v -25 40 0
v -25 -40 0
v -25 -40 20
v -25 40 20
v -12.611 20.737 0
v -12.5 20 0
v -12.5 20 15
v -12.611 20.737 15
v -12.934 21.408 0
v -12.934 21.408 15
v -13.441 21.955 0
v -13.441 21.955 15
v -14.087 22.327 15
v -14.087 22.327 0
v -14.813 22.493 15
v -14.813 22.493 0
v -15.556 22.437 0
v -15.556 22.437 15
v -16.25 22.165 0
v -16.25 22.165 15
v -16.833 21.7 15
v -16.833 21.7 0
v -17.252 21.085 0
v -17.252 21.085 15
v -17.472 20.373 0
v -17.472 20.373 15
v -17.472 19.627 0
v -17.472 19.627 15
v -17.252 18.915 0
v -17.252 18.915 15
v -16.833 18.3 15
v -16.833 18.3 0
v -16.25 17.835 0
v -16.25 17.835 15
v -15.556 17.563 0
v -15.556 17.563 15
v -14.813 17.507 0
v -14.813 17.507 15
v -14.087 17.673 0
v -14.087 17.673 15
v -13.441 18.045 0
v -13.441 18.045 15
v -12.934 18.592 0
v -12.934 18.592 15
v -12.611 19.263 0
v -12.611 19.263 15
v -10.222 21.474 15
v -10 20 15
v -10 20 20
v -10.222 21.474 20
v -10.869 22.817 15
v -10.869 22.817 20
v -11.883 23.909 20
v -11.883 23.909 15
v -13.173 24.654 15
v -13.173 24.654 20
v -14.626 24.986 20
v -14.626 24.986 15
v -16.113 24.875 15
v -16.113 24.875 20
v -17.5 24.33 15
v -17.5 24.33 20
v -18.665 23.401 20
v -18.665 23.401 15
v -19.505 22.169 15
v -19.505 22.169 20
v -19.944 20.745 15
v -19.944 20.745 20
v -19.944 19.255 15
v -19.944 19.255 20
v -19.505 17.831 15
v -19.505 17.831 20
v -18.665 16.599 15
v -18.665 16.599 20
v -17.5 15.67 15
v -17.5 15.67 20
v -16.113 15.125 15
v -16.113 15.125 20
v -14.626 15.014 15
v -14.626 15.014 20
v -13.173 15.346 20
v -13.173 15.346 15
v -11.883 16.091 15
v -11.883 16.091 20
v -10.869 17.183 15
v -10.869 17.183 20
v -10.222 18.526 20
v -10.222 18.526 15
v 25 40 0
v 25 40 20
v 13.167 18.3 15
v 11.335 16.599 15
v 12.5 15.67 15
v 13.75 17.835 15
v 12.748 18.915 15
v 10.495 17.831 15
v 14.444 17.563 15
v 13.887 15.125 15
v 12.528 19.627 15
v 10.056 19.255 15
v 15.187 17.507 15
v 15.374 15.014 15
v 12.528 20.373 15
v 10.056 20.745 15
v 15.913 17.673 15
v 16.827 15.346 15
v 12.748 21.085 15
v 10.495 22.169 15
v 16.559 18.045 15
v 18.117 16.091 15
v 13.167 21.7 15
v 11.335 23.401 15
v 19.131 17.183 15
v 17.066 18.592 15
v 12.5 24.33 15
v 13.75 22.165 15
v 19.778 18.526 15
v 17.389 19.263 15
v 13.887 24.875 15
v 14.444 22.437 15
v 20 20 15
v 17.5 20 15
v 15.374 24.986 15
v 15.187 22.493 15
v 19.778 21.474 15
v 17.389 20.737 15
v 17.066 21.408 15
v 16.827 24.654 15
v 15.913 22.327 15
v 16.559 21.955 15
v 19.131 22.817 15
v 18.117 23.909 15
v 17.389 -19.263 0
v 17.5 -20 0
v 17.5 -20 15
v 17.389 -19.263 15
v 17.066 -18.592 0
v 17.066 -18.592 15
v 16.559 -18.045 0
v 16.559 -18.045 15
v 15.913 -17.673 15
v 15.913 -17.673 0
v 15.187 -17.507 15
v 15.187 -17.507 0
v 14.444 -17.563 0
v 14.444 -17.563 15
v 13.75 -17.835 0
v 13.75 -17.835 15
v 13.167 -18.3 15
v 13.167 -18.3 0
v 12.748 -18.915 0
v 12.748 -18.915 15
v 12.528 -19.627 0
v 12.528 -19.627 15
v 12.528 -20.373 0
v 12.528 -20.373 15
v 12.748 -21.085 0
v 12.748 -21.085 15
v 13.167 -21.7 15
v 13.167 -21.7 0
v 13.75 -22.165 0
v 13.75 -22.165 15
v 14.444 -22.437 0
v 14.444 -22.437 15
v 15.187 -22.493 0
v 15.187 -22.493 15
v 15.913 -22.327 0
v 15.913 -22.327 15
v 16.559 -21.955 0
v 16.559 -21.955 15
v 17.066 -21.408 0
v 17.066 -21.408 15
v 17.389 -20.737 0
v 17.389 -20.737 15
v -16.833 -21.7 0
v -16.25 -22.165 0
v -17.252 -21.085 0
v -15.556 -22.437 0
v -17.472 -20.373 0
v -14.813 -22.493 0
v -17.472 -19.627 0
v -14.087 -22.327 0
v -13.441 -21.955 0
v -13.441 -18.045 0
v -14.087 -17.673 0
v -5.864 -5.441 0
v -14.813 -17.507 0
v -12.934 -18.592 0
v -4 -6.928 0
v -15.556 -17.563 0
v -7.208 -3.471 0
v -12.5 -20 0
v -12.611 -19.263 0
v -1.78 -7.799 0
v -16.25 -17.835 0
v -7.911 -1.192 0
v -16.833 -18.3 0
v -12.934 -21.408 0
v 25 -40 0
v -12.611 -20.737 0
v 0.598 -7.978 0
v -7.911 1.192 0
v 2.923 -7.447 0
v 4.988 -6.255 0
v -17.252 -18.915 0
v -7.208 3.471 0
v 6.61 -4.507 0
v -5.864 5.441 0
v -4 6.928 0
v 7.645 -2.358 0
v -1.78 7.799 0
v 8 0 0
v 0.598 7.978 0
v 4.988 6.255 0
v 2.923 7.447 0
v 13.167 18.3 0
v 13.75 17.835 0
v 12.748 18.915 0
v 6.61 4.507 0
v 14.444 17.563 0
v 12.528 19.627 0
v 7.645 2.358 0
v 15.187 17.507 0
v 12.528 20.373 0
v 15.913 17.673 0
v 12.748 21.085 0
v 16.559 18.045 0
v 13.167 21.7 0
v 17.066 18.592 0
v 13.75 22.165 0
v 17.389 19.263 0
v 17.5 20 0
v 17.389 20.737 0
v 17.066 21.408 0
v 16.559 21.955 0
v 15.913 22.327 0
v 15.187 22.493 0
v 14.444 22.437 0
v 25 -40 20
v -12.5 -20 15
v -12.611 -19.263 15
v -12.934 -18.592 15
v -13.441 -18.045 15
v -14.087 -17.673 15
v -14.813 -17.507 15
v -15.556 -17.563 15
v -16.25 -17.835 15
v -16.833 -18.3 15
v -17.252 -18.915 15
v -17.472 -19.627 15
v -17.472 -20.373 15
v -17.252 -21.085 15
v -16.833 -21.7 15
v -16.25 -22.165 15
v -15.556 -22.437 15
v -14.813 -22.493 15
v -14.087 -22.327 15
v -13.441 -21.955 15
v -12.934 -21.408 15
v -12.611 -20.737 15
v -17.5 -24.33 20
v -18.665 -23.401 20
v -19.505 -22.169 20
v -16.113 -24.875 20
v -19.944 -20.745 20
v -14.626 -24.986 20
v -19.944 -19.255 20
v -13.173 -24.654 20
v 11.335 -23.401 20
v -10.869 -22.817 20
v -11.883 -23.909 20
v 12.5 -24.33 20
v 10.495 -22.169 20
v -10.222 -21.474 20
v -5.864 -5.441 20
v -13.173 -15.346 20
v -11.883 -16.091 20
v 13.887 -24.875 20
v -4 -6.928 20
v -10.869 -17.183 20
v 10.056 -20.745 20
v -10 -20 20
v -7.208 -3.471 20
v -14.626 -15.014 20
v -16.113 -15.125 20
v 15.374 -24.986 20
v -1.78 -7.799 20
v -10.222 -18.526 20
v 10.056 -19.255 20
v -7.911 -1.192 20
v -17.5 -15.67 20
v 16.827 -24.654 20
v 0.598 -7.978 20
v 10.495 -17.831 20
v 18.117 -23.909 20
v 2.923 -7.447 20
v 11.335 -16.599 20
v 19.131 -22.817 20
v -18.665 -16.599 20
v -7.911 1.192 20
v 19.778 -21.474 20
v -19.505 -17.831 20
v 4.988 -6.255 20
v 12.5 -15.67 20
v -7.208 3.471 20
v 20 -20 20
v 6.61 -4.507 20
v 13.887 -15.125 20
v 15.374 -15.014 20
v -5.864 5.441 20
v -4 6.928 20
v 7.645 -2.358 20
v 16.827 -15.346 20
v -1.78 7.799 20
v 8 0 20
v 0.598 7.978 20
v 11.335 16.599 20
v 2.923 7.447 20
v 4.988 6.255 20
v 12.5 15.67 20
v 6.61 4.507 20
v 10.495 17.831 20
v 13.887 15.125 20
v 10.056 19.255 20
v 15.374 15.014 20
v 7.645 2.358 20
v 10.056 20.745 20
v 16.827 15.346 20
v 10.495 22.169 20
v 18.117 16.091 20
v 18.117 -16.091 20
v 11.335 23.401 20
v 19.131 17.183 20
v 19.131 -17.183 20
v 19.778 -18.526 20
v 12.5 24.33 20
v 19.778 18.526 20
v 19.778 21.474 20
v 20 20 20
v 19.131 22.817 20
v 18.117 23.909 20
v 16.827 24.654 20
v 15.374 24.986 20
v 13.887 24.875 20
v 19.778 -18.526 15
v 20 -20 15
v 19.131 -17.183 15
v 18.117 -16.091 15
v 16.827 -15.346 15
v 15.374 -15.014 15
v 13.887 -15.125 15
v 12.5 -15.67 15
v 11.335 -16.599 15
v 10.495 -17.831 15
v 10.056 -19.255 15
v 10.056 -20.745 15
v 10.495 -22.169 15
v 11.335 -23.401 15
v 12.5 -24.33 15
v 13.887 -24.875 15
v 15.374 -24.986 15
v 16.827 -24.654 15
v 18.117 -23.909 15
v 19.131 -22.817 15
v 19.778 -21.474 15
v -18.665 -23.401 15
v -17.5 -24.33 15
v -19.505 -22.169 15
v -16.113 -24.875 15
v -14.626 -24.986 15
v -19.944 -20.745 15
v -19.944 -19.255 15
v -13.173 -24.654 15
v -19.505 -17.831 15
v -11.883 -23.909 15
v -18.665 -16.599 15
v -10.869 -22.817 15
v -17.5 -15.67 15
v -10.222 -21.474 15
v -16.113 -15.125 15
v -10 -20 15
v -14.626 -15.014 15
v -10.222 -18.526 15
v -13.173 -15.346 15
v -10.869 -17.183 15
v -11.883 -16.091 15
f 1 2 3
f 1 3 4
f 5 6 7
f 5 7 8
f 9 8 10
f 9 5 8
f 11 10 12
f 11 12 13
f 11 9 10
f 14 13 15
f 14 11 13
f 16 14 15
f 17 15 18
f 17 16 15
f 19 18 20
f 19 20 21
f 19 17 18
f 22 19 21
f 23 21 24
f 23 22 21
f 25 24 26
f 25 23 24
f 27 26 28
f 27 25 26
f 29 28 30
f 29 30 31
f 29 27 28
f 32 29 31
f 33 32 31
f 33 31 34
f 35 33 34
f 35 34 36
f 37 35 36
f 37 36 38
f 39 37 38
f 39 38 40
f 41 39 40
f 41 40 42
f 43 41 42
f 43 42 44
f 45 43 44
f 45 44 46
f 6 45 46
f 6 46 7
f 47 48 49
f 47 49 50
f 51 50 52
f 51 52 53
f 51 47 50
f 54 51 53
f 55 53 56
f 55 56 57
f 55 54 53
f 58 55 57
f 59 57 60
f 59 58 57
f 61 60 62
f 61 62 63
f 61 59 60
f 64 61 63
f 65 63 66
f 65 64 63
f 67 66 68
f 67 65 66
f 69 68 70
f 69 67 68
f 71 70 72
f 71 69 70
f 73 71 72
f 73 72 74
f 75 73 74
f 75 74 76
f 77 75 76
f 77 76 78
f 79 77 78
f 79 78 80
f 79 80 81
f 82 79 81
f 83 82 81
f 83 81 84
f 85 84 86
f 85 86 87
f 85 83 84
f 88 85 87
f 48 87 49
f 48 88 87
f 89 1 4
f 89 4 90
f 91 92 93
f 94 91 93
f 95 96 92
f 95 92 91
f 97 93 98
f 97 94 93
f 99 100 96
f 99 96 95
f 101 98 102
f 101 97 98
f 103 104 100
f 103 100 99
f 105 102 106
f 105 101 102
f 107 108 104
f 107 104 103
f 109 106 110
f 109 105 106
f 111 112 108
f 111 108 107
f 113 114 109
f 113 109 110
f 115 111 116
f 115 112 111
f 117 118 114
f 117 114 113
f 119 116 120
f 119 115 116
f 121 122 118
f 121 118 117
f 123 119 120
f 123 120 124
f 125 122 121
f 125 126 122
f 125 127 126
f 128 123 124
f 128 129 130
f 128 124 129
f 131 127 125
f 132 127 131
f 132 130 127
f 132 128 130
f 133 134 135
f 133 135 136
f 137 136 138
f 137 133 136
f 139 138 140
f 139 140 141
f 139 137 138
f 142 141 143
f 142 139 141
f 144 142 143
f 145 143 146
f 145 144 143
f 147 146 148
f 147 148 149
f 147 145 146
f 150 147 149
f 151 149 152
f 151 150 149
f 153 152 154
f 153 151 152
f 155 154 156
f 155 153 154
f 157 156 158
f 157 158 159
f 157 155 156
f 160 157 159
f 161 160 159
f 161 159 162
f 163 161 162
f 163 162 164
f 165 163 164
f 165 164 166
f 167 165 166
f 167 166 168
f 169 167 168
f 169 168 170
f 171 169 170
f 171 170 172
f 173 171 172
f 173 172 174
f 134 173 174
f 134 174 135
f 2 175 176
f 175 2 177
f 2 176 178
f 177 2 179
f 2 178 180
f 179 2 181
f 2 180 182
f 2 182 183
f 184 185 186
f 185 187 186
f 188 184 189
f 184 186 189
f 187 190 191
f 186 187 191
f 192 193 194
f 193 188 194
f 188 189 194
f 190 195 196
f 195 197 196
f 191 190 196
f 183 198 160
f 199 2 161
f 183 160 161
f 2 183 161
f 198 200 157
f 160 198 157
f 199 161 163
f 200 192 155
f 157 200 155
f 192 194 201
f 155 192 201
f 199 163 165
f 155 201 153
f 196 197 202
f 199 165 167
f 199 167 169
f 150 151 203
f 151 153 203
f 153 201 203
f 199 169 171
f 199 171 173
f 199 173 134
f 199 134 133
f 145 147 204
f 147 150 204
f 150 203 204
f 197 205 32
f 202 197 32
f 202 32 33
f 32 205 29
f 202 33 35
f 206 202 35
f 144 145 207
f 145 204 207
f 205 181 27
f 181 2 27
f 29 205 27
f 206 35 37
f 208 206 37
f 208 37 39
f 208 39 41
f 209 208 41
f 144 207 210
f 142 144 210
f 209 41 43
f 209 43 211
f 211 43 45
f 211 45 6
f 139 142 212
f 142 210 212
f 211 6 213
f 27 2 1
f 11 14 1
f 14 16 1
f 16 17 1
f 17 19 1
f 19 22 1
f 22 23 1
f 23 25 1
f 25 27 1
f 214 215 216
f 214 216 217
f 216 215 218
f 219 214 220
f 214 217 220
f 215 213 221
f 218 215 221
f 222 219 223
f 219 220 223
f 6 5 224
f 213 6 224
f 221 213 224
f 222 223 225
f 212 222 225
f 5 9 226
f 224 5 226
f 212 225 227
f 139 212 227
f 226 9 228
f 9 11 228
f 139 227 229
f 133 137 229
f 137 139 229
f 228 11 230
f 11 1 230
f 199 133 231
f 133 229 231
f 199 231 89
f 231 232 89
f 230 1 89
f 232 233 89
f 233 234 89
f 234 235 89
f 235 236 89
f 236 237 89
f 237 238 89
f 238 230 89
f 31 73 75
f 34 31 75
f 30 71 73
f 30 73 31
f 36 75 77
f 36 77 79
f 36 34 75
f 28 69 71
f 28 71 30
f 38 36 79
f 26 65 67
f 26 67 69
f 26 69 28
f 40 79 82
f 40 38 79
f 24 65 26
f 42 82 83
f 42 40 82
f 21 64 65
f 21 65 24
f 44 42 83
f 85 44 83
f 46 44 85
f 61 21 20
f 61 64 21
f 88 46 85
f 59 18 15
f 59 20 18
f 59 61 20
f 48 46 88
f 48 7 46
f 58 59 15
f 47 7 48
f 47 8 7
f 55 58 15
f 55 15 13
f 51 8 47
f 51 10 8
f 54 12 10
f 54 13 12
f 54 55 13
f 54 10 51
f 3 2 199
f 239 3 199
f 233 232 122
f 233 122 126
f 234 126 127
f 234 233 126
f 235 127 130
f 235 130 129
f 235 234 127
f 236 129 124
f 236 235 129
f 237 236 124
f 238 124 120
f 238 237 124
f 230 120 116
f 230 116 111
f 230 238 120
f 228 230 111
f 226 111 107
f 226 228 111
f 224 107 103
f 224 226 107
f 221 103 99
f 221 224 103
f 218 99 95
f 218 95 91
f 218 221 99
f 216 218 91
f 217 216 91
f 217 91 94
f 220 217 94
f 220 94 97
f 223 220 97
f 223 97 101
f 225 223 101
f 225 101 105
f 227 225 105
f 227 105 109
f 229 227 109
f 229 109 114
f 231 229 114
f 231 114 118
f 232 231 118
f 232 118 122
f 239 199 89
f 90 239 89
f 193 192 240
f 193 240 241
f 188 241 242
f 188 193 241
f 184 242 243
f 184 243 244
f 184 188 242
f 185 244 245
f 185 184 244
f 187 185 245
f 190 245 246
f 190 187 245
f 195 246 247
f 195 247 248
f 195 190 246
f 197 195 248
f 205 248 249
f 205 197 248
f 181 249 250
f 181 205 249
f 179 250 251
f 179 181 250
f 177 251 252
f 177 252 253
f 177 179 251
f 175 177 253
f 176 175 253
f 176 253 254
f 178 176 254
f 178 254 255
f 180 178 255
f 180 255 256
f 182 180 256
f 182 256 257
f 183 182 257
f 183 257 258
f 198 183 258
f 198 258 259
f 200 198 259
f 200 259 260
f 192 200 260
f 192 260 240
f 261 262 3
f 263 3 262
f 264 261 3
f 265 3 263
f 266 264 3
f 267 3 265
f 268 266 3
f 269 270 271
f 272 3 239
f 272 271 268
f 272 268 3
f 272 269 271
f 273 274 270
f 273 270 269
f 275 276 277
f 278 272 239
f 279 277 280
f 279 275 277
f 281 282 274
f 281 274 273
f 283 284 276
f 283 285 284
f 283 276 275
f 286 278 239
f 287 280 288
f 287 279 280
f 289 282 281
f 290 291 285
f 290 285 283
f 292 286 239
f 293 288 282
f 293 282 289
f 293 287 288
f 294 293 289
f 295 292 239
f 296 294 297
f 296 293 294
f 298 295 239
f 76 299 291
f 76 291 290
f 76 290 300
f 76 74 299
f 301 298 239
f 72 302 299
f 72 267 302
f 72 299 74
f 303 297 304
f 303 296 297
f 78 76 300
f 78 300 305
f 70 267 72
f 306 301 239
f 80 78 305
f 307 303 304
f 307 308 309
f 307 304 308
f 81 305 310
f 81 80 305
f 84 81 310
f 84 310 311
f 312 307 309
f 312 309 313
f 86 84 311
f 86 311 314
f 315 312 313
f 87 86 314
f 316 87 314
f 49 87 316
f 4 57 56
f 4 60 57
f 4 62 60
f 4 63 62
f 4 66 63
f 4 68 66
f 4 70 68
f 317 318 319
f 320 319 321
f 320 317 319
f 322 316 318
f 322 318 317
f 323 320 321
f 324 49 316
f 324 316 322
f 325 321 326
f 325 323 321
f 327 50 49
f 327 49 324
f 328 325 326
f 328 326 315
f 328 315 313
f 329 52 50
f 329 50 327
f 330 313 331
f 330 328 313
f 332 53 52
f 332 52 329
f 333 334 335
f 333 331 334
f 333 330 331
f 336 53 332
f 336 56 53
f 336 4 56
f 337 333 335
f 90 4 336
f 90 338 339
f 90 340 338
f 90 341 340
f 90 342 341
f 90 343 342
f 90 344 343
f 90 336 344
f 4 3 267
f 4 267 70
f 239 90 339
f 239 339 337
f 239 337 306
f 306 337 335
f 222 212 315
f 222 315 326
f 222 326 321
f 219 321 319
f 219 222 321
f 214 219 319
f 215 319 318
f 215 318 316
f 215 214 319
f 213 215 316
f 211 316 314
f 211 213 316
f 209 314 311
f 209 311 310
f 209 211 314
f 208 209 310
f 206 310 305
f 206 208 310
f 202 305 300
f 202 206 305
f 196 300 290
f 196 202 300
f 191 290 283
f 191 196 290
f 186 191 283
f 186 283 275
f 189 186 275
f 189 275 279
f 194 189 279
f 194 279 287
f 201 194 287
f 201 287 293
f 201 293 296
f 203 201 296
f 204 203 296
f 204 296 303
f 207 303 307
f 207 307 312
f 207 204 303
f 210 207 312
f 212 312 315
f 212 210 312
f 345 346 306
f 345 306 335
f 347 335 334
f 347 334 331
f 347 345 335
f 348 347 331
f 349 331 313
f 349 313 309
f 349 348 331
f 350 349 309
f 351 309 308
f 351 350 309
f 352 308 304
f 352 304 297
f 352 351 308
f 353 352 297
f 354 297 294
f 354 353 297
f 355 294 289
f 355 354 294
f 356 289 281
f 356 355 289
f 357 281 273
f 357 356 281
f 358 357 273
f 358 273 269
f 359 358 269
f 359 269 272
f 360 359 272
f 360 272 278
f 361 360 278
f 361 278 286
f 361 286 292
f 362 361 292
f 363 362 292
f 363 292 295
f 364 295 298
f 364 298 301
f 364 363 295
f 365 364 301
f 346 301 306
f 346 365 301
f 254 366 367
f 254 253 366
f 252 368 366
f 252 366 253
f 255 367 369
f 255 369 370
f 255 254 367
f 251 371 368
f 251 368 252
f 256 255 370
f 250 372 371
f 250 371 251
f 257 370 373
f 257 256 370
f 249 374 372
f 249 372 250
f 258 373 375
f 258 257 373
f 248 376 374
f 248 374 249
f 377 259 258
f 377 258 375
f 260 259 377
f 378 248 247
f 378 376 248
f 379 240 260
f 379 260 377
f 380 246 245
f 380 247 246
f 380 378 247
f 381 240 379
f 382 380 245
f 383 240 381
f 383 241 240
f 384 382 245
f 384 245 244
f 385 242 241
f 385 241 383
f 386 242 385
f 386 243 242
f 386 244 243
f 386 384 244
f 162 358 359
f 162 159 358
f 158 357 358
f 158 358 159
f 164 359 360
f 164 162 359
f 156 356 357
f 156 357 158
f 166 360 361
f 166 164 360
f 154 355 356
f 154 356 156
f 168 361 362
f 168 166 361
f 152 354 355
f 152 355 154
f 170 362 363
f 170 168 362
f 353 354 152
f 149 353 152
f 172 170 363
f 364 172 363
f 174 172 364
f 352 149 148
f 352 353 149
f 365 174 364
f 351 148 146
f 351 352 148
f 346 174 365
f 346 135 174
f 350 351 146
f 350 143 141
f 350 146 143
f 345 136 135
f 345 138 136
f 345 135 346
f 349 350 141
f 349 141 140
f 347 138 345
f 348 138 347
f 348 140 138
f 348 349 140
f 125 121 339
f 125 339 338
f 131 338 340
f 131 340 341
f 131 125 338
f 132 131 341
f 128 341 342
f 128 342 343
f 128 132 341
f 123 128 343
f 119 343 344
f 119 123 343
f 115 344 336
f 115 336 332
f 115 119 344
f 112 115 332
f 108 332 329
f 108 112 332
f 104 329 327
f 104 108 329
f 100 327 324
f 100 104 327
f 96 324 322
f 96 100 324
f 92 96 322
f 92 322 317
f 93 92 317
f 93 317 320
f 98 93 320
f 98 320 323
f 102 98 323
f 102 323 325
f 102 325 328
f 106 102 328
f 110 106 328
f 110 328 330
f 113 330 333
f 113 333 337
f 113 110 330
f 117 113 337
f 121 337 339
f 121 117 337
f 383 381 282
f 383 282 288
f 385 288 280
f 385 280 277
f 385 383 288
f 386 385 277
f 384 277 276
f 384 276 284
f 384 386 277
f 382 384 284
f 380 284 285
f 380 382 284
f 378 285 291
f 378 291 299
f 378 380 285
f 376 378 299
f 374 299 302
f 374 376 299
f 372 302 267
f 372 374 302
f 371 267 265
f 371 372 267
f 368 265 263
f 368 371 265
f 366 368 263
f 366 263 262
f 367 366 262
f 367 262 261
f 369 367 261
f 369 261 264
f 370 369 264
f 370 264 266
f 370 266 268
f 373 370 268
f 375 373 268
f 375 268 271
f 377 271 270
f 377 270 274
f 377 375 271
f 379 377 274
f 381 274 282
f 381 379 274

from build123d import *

# Parameters (mm, degrees)
F0_W     = 50
F0_H     = 80
F0_R     = 5
F0_R_2   = 8
F0_R_3   = 2.5
F1_DEPTH = 20
F2_START = 15
F2_DEPTH = 5


with BuildPart() as f1:
    # F0 (on Top) → F1 (new body)
    with BuildSketch(Plane.XY):
        Rectangle(F0_W, F0_H)
        with Locations((-15, -20)):
            Circle(F0_R, mode=Mode.SUBTRACT)
        with Locations((15, -20)):
            Circle(F0_R, mode=Mode.SUBTRACT)
        with Locations((-15, 20)):
            Circle(F0_R, mode=Mode.SUBTRACT)
        Circle(F0_R_2, mode=Mode.SUBTRACT)
        with Locations((15, 20)):
            Circle(F0_R, mode=Mode.SUBTRACT)
        with Locations((-15, 20)):
            Circle(F0_R)
        with Locations((-15, 20)):
            Circle(F0_R_3, mode=Mode.SUBTRACT)
        with Locations((15, 20)):
            Circle(F0_R)
        with Locations((15, 20)):
            Circle(F0_R_3, mode=Mode.SUBTRACT)
        with Locations((15, -20)):
            Circle(F0_R)
        with Locations((15, -20)):
            Circle(F0_R_3, mode=Mode.SUBTRACT)
        with Locations((-15, -20)):
            Circle(F0_R)
        with Locations((-15, -20)):
            Circle(F0_R_3, mode=Mode.SUBTRACT)
    extrude(amount=F1_DEPTH)

    # F0 (on Top) → F2 (cut)
    with BuildSketch(Plane.XY.offset(F2_START)):
        with Locations((-15, -20)):
            Circle(F0_R)
        with Locations((-15, -20)):
            Circle(F0_R_3, mode=Mode.SUBTRACT)
        with Locations((15, -20)):
            Circle(F0_R)
        with Locations((15, -20)):
            Circle(F0_R_3, mode=Mode.SUBTRACT)
        with Locations((-15, 20)):
            Circle(F0_R)
        with Locations((-15, 20)):
            Circle(F0_R_3, mode=Mode.SUBTRACT)
        with Locations((15, 20)):
            Circle(F0_R)
        with Locations((15, 20)):
            Circle(F0_R_3, mode=Mode.SUBTRACT)
    extrude(amount=F2_DEPTH, mode=Mode.SUBTRACT)


solid = f1.part
